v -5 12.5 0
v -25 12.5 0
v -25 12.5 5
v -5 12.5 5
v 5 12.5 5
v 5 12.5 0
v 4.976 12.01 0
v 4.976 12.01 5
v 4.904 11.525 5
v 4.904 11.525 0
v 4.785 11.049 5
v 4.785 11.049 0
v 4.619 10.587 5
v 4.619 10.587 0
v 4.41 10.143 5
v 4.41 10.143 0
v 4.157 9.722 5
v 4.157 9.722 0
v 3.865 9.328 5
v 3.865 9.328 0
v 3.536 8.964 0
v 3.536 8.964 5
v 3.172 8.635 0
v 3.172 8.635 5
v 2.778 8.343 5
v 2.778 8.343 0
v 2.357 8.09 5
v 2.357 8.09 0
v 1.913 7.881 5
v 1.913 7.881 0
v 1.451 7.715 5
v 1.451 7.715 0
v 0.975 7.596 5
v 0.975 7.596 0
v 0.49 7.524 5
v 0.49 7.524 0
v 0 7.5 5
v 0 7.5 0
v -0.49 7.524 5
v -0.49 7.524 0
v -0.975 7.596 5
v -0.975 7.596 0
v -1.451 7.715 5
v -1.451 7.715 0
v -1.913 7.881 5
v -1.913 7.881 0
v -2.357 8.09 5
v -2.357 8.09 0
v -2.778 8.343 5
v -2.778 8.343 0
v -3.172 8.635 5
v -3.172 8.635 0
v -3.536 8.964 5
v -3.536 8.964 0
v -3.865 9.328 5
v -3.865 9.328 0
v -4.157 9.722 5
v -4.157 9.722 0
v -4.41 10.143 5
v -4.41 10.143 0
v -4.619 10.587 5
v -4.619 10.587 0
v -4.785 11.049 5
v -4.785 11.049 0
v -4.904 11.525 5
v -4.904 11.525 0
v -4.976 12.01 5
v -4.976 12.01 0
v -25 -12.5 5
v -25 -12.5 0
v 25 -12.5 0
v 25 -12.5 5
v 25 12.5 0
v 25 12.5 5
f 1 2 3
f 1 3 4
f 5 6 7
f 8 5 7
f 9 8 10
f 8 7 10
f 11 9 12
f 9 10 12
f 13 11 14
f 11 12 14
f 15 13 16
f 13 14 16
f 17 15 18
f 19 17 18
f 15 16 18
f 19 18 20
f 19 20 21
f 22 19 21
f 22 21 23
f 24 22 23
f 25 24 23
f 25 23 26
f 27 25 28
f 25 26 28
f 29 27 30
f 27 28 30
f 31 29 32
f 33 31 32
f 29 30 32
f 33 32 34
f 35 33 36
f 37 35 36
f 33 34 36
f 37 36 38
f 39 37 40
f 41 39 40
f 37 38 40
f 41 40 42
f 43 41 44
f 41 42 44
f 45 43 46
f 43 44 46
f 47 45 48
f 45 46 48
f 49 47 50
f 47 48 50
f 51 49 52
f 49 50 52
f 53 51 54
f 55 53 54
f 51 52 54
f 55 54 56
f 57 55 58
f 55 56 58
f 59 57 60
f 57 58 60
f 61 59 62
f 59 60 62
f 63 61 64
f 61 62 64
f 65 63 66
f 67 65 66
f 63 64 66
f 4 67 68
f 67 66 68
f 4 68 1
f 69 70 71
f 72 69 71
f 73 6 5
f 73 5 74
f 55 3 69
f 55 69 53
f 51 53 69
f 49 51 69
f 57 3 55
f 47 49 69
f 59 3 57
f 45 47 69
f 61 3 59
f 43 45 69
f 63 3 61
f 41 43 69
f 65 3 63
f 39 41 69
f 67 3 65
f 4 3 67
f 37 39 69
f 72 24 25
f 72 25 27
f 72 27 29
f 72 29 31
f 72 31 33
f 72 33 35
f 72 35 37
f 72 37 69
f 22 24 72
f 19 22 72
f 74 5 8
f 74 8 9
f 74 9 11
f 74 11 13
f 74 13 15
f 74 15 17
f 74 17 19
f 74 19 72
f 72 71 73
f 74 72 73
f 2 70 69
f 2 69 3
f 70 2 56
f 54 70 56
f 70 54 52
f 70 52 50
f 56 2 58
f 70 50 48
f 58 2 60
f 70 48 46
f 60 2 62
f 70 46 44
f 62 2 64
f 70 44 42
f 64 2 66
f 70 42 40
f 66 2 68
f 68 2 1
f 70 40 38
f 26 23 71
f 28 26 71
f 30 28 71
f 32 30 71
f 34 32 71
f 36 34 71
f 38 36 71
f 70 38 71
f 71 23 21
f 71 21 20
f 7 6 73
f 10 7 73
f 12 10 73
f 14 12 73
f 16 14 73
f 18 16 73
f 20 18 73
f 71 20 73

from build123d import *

# Parameters (mm, degrees)
SKETCH2_W           = 50
SKETCH2_H           = 25
BOSS_EXTRUDE2_DEPTH = 5
CUT_EXTRUDE1_DEPTH  = 5


with BuildPart() as part:
    # Sketch2 → Boss-Extrude2 (new body)
    with BuildSketch(Plane.XY):
        Rectangle(SKETCH2_W, SKETCH2_H)
    extrude(amount=BOSS_EXTRUDE2_DEPTH)

    # Sketch6 → Cut-Extrude1 (cut)
    with BuildSketch(Plane.XY):
        with BuildLine():
            Line((-5, 12.5), (5, 12.5))
            ThreePointArc((5, 12.5), (0, 7.5), (-5, 12.5))
        make_face()
    extrude(amount=CUT_EXTRUDE1_DEPTH, mode=Mode.SUBTRACT)


solid = part.part
